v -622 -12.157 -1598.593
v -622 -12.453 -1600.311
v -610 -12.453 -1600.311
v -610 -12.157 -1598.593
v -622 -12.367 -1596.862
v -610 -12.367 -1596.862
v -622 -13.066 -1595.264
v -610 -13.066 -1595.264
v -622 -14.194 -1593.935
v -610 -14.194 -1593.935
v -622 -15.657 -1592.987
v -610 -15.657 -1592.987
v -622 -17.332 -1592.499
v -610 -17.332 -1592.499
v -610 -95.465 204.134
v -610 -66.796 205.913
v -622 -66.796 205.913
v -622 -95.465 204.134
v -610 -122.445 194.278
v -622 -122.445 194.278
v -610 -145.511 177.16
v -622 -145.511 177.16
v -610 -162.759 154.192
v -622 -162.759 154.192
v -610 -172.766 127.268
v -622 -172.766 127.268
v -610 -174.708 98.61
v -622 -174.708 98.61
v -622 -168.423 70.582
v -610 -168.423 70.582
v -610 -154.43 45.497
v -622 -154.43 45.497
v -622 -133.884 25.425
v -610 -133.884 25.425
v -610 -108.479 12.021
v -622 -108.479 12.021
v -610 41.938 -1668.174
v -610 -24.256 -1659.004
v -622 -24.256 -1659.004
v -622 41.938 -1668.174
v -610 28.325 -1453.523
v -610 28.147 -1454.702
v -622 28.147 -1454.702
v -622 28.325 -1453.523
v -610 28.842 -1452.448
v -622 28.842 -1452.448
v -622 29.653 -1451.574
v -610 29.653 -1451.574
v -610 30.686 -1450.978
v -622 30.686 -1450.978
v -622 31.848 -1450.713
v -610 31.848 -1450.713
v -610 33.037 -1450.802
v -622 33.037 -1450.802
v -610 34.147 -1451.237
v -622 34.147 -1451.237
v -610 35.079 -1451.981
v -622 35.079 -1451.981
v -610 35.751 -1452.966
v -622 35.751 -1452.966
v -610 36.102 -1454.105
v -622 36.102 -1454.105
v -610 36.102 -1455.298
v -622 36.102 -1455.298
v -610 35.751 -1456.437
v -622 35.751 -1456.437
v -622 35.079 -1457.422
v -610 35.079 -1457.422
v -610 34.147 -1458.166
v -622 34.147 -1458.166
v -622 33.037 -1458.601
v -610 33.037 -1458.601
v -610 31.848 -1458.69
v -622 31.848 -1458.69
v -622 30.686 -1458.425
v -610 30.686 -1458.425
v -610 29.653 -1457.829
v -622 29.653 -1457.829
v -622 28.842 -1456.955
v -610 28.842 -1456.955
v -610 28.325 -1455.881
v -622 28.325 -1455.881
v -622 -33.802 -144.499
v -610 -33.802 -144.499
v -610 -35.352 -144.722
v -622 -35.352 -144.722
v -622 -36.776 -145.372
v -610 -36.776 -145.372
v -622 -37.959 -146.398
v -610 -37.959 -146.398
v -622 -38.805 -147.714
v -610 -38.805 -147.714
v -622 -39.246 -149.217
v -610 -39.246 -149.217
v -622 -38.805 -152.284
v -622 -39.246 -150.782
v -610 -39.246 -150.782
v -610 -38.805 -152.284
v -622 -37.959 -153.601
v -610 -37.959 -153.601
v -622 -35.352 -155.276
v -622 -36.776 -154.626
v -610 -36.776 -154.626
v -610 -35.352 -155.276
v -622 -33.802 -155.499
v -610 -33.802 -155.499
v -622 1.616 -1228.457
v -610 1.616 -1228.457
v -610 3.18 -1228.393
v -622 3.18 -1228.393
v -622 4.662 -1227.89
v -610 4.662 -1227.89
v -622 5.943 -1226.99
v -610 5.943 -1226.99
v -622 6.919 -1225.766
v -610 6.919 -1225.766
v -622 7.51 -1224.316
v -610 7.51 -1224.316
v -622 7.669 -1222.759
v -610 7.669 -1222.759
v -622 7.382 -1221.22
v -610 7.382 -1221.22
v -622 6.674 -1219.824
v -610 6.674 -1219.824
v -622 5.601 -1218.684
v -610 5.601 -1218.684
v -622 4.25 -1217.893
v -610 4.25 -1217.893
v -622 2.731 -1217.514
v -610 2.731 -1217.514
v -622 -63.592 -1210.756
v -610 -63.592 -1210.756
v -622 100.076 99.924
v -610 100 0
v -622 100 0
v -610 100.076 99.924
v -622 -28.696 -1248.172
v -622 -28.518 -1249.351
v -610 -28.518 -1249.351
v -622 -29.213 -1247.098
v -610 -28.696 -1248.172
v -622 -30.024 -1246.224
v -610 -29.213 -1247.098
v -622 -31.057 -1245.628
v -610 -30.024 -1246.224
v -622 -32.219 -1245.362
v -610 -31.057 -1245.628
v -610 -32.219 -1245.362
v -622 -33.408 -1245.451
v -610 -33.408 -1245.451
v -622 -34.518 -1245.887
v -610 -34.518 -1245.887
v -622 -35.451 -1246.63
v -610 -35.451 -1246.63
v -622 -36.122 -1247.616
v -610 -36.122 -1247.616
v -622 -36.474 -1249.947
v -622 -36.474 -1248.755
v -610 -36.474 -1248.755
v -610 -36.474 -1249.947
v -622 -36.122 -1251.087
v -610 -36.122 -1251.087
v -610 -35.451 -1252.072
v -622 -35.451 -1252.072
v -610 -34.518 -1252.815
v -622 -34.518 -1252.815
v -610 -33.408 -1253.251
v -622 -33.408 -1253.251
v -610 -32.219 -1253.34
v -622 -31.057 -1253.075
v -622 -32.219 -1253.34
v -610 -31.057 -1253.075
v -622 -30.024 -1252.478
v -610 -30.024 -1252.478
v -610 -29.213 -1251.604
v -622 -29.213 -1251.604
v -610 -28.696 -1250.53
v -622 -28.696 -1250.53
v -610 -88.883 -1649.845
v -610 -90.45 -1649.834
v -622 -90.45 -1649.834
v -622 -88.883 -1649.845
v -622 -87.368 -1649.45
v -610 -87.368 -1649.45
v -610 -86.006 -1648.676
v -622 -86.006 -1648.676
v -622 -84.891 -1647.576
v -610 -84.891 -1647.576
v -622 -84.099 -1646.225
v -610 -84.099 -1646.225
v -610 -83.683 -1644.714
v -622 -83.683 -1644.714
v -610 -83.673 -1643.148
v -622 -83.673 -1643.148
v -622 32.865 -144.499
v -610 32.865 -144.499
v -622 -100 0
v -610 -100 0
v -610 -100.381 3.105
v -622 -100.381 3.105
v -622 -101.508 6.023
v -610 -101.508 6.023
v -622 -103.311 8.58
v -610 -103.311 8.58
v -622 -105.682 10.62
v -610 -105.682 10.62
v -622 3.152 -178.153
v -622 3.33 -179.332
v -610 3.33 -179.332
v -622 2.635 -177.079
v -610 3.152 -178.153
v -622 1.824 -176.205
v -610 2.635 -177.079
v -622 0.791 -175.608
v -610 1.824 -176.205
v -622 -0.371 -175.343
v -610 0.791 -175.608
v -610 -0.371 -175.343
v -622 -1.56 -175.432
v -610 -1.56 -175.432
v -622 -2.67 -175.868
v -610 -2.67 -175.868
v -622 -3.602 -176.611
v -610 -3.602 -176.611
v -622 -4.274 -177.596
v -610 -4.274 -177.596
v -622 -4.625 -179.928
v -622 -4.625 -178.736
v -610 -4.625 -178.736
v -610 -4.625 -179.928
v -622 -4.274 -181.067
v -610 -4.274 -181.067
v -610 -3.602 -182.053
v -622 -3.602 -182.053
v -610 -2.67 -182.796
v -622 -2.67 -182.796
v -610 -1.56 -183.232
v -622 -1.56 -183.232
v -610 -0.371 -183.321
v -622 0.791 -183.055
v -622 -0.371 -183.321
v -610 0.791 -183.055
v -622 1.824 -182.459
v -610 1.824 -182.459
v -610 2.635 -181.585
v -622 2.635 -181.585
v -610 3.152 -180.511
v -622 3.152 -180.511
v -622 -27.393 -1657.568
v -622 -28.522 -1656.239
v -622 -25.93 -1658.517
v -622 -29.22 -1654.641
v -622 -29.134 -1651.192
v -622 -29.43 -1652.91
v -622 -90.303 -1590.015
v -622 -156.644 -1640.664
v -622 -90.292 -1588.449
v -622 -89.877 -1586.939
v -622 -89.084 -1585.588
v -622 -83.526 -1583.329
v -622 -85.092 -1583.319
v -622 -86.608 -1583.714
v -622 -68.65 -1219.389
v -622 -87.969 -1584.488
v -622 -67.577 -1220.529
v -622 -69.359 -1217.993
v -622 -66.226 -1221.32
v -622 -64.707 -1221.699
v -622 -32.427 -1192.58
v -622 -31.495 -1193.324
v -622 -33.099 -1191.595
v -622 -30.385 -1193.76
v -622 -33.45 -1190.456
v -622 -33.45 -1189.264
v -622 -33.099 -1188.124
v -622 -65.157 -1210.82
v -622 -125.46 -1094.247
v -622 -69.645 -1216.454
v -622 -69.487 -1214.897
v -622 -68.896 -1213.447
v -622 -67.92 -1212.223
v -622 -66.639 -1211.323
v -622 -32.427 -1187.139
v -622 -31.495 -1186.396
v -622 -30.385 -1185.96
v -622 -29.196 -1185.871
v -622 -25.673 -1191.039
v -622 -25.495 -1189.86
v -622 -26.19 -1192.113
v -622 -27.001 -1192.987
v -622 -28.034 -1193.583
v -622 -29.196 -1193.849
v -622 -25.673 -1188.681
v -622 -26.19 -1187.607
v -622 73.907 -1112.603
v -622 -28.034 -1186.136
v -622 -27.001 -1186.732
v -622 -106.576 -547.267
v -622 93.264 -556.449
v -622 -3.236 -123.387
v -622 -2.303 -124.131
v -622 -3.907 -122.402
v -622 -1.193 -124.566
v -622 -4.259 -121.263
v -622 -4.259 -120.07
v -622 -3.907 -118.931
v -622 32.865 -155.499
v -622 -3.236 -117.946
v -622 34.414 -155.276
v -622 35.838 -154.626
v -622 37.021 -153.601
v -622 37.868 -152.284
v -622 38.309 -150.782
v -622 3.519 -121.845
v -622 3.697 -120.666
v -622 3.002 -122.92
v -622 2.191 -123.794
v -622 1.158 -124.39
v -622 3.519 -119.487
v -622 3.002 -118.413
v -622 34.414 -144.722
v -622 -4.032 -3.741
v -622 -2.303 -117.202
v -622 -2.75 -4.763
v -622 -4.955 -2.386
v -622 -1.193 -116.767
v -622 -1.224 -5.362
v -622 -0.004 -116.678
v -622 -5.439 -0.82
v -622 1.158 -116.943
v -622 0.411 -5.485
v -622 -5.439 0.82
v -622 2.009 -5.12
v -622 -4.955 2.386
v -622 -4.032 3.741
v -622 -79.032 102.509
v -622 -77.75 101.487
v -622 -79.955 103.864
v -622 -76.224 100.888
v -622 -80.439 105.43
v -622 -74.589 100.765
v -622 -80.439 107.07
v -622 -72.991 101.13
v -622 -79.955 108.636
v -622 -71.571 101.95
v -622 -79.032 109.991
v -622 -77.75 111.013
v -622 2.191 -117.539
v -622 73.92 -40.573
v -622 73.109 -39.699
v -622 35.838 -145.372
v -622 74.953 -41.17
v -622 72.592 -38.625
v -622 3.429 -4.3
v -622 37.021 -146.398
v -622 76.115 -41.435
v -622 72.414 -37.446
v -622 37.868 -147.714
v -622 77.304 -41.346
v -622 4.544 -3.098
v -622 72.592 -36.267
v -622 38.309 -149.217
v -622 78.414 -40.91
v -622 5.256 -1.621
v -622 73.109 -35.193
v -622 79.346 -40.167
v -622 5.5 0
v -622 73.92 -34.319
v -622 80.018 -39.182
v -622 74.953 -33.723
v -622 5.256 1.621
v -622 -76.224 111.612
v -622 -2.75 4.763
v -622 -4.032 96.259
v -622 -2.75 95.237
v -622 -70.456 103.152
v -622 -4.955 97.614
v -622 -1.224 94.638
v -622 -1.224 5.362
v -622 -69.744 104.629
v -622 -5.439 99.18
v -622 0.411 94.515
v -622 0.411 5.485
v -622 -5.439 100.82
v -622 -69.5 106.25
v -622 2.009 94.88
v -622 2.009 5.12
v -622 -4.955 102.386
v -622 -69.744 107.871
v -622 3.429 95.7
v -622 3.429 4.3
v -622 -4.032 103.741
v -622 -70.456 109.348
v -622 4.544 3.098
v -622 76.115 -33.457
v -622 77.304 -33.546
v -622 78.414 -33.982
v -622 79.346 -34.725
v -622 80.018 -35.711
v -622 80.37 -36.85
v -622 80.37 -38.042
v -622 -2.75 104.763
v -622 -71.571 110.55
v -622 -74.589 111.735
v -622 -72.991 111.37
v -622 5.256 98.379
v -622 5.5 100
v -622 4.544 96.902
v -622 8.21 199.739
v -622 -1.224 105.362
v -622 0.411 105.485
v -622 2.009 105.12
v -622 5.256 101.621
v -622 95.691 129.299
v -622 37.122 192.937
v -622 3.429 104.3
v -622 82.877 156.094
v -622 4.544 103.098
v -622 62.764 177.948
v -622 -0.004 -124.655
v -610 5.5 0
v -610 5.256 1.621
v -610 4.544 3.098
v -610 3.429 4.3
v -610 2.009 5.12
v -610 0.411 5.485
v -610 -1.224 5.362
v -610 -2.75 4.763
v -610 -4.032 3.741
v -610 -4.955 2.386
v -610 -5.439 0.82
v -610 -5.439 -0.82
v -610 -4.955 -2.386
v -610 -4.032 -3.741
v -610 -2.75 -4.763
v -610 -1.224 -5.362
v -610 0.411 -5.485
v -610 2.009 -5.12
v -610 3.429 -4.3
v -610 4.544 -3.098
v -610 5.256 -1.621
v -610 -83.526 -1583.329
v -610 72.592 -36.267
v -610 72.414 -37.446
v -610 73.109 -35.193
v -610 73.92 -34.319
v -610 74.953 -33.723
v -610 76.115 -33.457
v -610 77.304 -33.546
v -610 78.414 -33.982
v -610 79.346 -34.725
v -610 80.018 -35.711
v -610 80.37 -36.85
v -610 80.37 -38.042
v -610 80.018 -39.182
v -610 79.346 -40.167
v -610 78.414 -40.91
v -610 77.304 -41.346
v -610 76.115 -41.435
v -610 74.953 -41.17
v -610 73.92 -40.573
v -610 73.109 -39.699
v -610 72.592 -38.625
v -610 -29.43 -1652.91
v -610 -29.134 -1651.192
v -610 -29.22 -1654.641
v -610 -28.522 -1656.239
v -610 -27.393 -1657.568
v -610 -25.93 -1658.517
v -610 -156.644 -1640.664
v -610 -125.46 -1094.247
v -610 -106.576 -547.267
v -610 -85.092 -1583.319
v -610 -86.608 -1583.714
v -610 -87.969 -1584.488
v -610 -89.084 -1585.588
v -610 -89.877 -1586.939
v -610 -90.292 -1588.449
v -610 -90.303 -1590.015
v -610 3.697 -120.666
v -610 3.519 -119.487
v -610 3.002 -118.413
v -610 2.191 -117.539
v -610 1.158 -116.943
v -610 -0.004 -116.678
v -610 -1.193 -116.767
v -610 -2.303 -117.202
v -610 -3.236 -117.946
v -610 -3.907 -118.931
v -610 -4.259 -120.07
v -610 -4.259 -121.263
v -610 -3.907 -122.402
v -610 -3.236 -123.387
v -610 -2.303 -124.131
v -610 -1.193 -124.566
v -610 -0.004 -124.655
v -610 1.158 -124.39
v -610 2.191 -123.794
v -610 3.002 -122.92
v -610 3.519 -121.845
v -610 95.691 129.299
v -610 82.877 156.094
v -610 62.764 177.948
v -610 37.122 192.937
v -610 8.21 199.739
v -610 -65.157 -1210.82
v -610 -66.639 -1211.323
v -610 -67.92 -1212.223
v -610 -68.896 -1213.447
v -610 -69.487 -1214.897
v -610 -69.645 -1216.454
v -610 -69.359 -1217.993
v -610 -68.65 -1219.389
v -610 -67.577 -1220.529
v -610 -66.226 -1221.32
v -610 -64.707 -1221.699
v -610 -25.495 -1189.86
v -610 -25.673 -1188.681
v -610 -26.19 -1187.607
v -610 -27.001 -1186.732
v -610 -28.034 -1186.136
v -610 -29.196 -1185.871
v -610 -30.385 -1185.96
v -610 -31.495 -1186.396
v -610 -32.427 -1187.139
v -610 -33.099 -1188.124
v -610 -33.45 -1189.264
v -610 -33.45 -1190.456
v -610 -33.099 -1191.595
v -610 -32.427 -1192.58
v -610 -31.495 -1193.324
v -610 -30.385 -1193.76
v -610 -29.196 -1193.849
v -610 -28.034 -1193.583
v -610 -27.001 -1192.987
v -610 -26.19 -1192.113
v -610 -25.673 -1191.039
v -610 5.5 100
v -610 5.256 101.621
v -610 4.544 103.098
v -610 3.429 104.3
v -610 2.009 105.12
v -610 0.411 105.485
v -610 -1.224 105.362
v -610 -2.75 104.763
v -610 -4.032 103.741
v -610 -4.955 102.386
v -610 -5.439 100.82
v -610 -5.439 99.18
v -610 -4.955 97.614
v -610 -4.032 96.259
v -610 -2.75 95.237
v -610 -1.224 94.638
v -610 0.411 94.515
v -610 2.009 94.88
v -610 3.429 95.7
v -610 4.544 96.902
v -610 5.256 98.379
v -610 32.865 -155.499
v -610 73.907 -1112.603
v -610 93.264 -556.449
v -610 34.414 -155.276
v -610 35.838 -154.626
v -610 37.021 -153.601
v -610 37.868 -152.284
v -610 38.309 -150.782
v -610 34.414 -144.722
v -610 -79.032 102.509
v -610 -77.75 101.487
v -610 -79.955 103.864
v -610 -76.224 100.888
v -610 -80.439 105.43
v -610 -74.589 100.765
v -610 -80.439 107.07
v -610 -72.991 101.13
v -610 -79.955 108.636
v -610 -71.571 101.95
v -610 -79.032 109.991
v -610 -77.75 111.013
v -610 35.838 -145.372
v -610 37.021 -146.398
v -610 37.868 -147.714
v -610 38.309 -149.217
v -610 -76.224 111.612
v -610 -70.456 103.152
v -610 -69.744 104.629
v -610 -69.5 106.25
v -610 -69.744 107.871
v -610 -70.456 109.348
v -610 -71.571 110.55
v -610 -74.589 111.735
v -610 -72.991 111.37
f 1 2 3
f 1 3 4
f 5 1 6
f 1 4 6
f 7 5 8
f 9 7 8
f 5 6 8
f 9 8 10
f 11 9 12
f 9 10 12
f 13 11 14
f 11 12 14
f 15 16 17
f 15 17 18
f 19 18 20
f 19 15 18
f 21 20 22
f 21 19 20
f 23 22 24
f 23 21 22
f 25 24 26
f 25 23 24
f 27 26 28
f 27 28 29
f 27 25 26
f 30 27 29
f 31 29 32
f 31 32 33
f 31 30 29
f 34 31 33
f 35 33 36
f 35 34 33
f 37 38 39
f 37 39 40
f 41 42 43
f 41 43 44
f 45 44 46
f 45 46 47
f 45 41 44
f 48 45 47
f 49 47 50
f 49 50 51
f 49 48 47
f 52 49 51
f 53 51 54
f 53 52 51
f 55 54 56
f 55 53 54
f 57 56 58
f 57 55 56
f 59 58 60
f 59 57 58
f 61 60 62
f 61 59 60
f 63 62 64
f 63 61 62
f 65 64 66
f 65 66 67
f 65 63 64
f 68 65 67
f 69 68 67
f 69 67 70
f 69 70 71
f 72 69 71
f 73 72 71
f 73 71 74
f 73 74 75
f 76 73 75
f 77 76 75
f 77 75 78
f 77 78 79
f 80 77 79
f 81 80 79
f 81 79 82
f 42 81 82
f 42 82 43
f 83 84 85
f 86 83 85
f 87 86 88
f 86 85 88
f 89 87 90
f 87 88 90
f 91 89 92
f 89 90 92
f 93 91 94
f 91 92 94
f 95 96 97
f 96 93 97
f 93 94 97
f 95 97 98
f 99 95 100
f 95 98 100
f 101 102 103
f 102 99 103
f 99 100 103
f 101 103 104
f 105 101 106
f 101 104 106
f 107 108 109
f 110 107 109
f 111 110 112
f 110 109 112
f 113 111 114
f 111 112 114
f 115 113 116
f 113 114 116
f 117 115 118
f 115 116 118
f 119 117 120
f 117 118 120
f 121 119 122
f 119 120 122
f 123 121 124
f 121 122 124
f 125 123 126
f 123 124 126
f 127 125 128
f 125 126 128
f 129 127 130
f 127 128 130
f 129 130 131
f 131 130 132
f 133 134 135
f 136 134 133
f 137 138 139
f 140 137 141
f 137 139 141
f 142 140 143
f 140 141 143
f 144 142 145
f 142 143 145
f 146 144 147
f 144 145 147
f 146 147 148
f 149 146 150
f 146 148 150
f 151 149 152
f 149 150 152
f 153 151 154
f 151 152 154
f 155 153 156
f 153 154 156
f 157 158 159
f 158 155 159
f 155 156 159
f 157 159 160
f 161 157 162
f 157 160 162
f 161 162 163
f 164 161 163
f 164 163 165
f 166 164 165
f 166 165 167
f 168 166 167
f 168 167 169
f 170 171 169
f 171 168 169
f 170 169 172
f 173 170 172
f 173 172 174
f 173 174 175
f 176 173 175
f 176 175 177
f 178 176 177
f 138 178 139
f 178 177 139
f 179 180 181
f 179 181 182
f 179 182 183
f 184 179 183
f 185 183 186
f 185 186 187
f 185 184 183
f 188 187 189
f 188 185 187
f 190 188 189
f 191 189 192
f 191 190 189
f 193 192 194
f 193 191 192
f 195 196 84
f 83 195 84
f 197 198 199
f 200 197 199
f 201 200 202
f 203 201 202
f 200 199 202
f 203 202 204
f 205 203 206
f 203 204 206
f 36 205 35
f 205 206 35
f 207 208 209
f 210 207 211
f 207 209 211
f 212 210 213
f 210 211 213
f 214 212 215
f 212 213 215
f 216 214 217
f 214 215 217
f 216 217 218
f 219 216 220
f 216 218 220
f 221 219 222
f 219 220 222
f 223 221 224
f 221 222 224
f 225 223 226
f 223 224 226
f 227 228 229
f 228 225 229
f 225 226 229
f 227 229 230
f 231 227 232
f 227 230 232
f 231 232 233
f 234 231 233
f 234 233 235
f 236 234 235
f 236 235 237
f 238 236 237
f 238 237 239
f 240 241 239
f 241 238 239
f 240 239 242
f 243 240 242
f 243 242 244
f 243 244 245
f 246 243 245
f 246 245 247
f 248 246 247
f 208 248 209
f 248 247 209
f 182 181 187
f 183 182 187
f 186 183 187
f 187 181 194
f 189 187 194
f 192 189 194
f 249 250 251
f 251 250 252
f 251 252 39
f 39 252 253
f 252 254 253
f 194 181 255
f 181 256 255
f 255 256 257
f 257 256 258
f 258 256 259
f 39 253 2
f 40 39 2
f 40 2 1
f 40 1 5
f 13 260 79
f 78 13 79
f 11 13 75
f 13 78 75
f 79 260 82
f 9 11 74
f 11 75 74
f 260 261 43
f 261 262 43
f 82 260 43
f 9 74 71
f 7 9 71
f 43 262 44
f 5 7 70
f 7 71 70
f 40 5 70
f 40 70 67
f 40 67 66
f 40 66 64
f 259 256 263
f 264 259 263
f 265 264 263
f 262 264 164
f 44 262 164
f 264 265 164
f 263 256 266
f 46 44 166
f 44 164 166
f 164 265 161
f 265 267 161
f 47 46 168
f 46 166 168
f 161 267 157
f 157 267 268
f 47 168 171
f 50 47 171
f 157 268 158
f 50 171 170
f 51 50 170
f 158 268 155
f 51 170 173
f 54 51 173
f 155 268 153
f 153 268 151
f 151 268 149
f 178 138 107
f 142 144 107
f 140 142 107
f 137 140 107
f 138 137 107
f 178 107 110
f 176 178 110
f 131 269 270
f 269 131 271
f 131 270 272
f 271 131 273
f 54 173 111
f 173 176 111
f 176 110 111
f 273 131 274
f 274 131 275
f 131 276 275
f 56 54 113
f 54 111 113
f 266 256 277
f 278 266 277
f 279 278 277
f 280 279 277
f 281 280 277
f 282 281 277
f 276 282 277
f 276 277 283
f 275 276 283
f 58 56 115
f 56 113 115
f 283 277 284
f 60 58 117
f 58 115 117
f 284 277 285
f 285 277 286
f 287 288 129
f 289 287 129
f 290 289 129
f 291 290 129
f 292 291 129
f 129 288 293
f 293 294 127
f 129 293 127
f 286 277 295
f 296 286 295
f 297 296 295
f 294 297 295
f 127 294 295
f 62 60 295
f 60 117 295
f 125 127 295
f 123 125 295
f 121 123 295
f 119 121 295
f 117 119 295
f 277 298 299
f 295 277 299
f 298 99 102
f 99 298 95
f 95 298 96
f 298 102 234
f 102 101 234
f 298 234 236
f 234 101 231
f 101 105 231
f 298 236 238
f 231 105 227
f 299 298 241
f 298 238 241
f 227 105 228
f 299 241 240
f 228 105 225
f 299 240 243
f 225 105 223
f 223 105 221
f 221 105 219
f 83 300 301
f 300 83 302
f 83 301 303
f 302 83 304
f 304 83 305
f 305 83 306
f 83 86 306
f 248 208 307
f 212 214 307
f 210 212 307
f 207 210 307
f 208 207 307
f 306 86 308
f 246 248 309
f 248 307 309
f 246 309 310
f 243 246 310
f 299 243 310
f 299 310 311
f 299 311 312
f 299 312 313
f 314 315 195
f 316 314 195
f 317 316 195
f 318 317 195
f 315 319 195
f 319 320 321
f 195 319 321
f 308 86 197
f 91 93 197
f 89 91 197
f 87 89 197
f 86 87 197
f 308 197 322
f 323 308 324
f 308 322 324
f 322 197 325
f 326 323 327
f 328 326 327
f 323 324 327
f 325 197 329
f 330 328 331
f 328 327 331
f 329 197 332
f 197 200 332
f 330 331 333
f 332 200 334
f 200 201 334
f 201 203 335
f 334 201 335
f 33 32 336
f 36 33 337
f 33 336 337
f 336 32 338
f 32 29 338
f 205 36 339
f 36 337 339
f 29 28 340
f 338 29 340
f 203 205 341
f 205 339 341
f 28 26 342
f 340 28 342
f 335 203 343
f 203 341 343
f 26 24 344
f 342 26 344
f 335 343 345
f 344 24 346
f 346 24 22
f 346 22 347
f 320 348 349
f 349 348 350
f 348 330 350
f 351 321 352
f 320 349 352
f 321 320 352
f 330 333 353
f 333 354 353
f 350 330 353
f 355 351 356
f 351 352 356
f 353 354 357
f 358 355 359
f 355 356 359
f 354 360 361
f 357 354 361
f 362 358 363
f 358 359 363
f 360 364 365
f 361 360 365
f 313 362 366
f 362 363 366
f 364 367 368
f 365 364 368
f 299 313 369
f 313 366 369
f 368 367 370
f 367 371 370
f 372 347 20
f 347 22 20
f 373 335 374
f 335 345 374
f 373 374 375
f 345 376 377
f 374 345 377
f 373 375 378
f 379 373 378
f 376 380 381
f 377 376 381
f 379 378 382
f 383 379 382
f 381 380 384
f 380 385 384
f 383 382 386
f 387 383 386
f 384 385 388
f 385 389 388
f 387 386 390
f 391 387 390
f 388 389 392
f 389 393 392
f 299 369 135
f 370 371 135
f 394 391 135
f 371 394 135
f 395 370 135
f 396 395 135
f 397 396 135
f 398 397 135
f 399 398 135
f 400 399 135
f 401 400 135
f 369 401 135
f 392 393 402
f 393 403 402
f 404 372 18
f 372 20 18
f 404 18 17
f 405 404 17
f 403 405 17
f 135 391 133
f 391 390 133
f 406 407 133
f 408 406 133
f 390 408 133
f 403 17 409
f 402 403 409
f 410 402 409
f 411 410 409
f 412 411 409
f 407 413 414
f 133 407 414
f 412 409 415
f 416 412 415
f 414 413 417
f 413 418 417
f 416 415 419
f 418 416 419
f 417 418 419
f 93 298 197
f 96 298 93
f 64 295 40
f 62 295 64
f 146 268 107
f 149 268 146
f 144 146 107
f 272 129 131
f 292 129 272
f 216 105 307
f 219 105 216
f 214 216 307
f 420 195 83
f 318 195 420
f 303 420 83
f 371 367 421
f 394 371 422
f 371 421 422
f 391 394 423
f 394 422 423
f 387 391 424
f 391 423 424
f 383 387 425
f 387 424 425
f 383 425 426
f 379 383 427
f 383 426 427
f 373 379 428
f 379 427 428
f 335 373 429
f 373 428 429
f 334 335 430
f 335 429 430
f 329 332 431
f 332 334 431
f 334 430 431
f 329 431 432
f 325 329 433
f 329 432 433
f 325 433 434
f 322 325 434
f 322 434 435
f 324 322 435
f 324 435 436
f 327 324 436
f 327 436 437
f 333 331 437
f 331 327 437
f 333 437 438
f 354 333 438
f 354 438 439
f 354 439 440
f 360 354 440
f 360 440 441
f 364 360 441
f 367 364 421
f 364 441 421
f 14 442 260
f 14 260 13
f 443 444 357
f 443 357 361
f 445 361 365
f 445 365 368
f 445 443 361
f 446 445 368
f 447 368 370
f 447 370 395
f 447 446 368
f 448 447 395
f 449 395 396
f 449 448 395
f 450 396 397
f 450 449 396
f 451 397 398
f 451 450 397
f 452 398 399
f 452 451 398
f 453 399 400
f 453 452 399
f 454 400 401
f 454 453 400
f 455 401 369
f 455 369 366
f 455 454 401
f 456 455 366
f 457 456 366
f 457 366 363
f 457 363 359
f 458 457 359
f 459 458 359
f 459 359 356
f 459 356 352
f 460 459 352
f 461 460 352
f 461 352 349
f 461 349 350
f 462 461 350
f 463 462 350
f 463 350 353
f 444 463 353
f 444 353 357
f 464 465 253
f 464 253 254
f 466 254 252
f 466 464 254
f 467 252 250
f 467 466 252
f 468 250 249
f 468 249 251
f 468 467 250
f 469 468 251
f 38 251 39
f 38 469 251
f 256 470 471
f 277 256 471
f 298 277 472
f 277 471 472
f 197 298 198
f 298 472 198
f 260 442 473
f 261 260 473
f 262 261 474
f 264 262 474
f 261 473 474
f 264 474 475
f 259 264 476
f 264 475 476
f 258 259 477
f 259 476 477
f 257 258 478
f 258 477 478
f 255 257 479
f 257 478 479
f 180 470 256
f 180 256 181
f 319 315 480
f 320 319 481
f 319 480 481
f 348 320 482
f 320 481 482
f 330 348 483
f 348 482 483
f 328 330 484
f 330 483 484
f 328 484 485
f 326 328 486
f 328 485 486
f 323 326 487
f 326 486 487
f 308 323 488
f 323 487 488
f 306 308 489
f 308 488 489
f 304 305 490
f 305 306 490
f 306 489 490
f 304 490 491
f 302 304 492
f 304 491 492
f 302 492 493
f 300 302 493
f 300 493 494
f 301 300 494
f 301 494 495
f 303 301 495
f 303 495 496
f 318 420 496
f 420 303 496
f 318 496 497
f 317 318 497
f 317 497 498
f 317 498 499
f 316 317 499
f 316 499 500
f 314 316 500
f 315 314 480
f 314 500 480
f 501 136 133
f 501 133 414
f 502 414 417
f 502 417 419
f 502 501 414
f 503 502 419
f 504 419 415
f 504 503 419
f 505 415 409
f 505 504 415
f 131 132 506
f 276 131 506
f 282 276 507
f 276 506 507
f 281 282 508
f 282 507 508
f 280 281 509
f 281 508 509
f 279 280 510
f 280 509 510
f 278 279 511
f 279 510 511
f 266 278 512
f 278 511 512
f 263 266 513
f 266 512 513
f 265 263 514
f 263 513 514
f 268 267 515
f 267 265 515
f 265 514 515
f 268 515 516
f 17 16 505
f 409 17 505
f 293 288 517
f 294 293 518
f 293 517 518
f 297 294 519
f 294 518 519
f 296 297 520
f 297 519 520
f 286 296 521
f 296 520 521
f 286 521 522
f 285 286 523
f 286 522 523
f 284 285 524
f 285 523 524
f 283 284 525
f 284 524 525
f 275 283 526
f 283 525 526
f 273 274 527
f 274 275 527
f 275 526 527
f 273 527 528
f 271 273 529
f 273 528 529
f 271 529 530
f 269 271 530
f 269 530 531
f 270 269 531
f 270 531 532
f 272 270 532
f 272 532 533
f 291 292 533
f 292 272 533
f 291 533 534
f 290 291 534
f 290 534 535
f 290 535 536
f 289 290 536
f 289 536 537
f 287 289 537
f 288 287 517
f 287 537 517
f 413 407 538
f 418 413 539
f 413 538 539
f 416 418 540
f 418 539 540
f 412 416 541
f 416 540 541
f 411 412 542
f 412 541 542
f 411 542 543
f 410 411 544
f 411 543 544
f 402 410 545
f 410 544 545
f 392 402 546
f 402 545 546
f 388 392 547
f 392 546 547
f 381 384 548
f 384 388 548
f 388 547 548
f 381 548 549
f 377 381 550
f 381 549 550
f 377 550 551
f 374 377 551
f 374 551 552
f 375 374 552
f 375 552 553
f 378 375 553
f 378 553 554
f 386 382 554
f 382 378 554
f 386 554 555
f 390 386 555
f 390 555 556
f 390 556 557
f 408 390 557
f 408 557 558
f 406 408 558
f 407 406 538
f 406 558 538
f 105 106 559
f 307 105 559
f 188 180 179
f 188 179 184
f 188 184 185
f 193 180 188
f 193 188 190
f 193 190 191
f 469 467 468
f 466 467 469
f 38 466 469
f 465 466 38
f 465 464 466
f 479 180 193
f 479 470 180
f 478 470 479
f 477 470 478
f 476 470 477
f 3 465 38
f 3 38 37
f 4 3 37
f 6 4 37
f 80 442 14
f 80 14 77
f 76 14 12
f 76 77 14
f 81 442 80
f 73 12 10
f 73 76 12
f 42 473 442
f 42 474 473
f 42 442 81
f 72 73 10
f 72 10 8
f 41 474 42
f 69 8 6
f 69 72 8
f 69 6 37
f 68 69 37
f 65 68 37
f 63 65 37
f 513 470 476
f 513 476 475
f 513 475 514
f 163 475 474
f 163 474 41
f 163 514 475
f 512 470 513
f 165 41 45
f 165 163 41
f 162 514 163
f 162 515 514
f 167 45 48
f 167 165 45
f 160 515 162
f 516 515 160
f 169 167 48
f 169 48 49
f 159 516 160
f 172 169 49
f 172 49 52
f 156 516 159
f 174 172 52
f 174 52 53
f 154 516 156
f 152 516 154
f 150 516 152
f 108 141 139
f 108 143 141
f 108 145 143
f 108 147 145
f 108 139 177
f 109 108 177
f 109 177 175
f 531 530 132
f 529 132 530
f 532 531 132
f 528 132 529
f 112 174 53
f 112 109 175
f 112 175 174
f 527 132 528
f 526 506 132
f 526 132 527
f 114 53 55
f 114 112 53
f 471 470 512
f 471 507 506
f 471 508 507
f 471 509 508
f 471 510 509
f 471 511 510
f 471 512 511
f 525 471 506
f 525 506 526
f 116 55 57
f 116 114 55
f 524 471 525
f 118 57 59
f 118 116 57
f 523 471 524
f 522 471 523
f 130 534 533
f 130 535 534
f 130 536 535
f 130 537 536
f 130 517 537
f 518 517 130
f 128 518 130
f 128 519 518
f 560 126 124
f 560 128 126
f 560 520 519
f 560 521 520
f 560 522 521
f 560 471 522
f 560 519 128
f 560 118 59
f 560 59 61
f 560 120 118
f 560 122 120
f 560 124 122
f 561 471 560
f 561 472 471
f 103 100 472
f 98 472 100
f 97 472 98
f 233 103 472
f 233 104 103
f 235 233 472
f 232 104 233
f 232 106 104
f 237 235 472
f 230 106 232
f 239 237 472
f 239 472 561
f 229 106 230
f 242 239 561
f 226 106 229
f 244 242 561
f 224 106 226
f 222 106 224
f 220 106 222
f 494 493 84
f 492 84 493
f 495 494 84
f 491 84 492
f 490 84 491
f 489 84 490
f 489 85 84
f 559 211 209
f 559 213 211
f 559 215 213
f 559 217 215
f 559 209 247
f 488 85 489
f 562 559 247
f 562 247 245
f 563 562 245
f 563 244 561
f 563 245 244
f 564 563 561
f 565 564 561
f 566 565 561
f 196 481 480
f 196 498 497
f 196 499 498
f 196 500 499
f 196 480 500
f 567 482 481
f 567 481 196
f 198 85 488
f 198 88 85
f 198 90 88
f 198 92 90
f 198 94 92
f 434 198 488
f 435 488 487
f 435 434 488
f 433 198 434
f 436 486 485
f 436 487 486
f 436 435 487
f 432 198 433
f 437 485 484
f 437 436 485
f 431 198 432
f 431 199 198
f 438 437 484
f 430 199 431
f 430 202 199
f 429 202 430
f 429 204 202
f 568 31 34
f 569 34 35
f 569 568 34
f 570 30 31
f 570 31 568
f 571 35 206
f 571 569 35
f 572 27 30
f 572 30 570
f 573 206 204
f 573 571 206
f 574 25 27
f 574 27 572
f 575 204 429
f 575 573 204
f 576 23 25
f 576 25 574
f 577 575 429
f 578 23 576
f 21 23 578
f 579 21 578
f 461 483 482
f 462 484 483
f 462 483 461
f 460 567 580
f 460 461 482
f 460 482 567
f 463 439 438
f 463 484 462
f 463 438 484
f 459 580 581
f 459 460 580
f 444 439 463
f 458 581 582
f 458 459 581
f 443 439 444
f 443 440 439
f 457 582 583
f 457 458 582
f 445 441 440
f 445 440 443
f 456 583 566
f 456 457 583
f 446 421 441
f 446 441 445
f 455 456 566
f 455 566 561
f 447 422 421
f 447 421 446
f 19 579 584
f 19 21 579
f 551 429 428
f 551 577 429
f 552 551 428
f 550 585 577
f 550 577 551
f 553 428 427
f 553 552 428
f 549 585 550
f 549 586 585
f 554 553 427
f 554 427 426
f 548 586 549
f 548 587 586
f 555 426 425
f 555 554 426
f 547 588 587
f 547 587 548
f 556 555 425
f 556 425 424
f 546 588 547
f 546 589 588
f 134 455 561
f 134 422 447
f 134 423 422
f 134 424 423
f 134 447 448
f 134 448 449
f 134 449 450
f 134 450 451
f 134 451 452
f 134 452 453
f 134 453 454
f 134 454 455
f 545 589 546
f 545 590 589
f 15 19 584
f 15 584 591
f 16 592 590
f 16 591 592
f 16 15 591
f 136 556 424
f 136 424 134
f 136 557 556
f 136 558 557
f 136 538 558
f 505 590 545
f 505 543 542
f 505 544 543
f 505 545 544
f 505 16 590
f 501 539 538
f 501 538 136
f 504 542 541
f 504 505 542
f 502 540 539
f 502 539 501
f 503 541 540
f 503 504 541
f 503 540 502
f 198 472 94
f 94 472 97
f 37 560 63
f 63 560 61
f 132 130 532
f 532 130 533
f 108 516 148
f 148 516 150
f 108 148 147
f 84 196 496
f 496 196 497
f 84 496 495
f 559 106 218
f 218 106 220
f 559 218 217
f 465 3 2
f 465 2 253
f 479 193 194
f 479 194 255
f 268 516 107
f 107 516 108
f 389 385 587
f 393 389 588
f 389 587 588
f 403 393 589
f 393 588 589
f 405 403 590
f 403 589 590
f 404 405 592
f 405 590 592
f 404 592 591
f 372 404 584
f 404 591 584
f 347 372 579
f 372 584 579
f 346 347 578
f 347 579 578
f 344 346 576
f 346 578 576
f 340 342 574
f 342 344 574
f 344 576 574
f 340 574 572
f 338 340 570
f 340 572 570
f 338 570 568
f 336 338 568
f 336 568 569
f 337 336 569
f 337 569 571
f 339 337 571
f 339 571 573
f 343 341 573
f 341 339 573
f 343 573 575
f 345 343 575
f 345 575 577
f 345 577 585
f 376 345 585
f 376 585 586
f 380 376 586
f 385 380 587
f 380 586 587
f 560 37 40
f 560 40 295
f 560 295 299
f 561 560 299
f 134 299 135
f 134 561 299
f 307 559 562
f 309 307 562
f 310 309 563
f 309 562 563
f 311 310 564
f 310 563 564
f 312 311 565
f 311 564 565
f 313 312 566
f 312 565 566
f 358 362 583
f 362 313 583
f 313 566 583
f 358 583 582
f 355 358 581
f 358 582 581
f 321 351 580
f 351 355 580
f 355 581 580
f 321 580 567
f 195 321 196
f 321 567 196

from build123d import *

# Parameters (mm, degrees)
PAD002_DEPTH    = 12
SKETCH005_R     = 5.5
HOLE_DEPTH      = 12.001
SKETCH015_R     = 4
POCKET002_DEPTH = 12.001
SKETCH040_R     = 4
HOLE007_DEPTH   = 622.001


with BuildPart() as side_right_top_part:
    # Sketch002 → Pad002 (new body)
    with BuildSketch(Plane.YZ):
        with BuildLine():
            ThreePointArc((100.076043, 99.923842), (73.635745, 167.771654), (8.210055, 199.738734))
            Line((-66.796185, 205.912919), (8.210055, 199.738734))
            ThreePointArc((-66.796185, 205.912919), (-172.766313, 127.267802), (-108.47912, 12.020766))
            ThreePointArc((-100, 0), (-102.330526, 7.356964), (-108.47912, 12.020766))
            ThreePointArc((-156.643717, -1640.664457), (-114.479942, -820.810119), (-100, 0))
            Line((-156.643717, -1640.664457), (-90.449657, -1649.834344))
            ThreePointArc((-90.449657, -1649.834344), (-85.412451, -1648.162301), (-83.672514, -1643.148141))
            Line((-83.672514, -1643.148141), (-90.302786, -1590.015365))
            ThreePointArc((-83.525643, -1583.329162), (-88.56285, -1585.001205), (-90.302786, -1590.015365))
            Line((-83.525643, -1583.329162), (-17.331583, -1592.49905))
            ThreePointArc((-12.453464, -1600.311408), (-13.065566, -1595.264457), (-17.331583, -1592.49905))
            Line((-12.453464, -1600.311408), (-29.133717, -1651.191872))
            ThreePointArc((-29.133717, -1651.191872), (-28.521615, -1656.238824), (-24.255598, -1659.004231))
            Line((-24.255598, -1659.004231), (41.938462, -1668.174118))
            ThreePointArc((41.938462, -1668.174118), (85.162756, -834.581071), (100, 0))
            Line((100, 0), (100.076043, 99.923842))
        make_face()
    extrude(amount=PAD002_DEPTH)

    # Sketch005 → Hole (cut, through all)
    with BuildSketch(Plane.YZ):
        with Locations((0, 100)):
            Circle(SKETCH005_R)
        with Locations((-75, 106.25)):
            Circle(SKETCH005_R)
        Circle(SKETCH005_R)
    extrude(amount=HOLE_DEPTH, mode=Mode.SUBTRACT)

    # Sketch015 → Pocket002 (cut, through all)
    with BuildSketch(Plane.YZ):
        with Locations((-0.303341, -120.666401)):
            Circle(SKETCH015_R)
        with Locations((-0.669999, -179.331911)):
            Circle(SKETCH015_R)
        with Locations((-29.495132, -1189.859798)):
            Circle(SKETCH015_R)
        with Locations((-32.518295, -1249.351095)):
            Circle(SKETCH015_R)
        with Locations((-130.873609, -2506.378514)):
            Circle(SKETCH015_R)
        with Locations((-136.971781, -2564.727371)):
            Circle(SKETCH015_R)
        with BuildLine():
            ThreePointArc((-63.5924, -1210.755644), (-69.621614, -1215.669765), (-64.707493, -1221.698978))
            Line((-64.707493, -1221.698978), (1.615745, -1228.457117))
            ThreePointArc((1.615745, -1228.457117), (7.644959, -1223.542997), (2.730838, -1217.513783))
            Line((2.730838, -1217.513783), (-63.5924, -1210.755644))
        make_face()
        with BuildLine():
            ThreePointArc((-33.802079, -144.499268), (-39.302079, -149.999268), (-33.802079, -155.499268))
            Line((-33.802079, -155.499268), (32.864588, -155.499268))
            ThreePointArc((32.864588, -155.499268), (38.364588, -149.999268), (32.864588, -144.499268))
            Line((32.864588, -144.499268), (-33.802079, -144.499268))
        make_face()
        with BuildLine():
            ThreePointArc((-165.386078, -2523.207318), (-171.913956, -2527.436597), (-167.684677, -2533.964476))
            Line((-167.684677, -2533.964476), (-102.489783, -2547.895382))
            ThreePointArc((-102.489783, -2547.895382), (-95.961904, -2543.666103), (-100.191183, -2537.138225))
            Line((-100.191183, -2537.138225), (-165.386078, -2523.207318))
        make_face()
        with BuildLine():
            ThreePointArc((-307.201152, -3631.252582), (-314.086519, -3634.870829), (-310.468272, -3641.756197))
            Line((-310.468272, -3641.756197), (-246.81, -3661.556925))
            ThreePointArc((-246.81, -3661.556925), (-239.924632, -3657.938678), (-243.542879, -3651.05331))
            Line((-243.542879, -3651.05331), (-307.201152, -3631.252582))
        make_face()
        with BuildLine():
            ThreePointArc((-498.714671, -4731.898869), (-505.894975, -4734.889394), (-502.90445, -4742.069697))
            Line((-502.90445, -4742.069697), (-441.263063, -4767.462292))
            ThreePointArc((-441.263063, -4767.462292), (-434.082759, -4764.471767), (-437.073284, -4757.291463))
            Line((-437.073284, -4757.291463), (-498.714671, -4731.898869))
        make_face()
    extrude(amount=POCKET002_DEPTH, mode=Mode.SUBTRACT)

    # Sketch040 (on Face1 of ShapeBinder) → Hole007 (cut, through all)
    with BuildSketch(Plane(origin=(-610, 0, 0), x_dir=(0, -1, 0), z_dir=(-1, 0, 0))):
        with Locations((-32.147032, -1454.701534)):
            Circle(SKETCH040_R)
        with Locations((-2.949201, -1878.284217)):
            Circle(SKETCH040_R)
        with Locations((-76.414195, -37.446092)):
            Circle(SKETCH040_R)
    extrude(amount=-HOLE007_DEPTH, mode=Mode.SUBTRACT)


with BuildPart() as side_right_top_part_1:
    # Body003 placement: moved
    add(side_right_top_part.part.moved(Location((610, 0, 0))))


with BuildPart() as side_left_top_part:
    # Part__Mirroring: instance of side_right_top_part
    add(side_right_top_part_1.part.mirror(Plane(origin=(-0.000122, -37.441761, -731.130615), x_dir=(0, -1, 0), z_dir=(1, 0, 0))))


solid = side_left_top_part.part
